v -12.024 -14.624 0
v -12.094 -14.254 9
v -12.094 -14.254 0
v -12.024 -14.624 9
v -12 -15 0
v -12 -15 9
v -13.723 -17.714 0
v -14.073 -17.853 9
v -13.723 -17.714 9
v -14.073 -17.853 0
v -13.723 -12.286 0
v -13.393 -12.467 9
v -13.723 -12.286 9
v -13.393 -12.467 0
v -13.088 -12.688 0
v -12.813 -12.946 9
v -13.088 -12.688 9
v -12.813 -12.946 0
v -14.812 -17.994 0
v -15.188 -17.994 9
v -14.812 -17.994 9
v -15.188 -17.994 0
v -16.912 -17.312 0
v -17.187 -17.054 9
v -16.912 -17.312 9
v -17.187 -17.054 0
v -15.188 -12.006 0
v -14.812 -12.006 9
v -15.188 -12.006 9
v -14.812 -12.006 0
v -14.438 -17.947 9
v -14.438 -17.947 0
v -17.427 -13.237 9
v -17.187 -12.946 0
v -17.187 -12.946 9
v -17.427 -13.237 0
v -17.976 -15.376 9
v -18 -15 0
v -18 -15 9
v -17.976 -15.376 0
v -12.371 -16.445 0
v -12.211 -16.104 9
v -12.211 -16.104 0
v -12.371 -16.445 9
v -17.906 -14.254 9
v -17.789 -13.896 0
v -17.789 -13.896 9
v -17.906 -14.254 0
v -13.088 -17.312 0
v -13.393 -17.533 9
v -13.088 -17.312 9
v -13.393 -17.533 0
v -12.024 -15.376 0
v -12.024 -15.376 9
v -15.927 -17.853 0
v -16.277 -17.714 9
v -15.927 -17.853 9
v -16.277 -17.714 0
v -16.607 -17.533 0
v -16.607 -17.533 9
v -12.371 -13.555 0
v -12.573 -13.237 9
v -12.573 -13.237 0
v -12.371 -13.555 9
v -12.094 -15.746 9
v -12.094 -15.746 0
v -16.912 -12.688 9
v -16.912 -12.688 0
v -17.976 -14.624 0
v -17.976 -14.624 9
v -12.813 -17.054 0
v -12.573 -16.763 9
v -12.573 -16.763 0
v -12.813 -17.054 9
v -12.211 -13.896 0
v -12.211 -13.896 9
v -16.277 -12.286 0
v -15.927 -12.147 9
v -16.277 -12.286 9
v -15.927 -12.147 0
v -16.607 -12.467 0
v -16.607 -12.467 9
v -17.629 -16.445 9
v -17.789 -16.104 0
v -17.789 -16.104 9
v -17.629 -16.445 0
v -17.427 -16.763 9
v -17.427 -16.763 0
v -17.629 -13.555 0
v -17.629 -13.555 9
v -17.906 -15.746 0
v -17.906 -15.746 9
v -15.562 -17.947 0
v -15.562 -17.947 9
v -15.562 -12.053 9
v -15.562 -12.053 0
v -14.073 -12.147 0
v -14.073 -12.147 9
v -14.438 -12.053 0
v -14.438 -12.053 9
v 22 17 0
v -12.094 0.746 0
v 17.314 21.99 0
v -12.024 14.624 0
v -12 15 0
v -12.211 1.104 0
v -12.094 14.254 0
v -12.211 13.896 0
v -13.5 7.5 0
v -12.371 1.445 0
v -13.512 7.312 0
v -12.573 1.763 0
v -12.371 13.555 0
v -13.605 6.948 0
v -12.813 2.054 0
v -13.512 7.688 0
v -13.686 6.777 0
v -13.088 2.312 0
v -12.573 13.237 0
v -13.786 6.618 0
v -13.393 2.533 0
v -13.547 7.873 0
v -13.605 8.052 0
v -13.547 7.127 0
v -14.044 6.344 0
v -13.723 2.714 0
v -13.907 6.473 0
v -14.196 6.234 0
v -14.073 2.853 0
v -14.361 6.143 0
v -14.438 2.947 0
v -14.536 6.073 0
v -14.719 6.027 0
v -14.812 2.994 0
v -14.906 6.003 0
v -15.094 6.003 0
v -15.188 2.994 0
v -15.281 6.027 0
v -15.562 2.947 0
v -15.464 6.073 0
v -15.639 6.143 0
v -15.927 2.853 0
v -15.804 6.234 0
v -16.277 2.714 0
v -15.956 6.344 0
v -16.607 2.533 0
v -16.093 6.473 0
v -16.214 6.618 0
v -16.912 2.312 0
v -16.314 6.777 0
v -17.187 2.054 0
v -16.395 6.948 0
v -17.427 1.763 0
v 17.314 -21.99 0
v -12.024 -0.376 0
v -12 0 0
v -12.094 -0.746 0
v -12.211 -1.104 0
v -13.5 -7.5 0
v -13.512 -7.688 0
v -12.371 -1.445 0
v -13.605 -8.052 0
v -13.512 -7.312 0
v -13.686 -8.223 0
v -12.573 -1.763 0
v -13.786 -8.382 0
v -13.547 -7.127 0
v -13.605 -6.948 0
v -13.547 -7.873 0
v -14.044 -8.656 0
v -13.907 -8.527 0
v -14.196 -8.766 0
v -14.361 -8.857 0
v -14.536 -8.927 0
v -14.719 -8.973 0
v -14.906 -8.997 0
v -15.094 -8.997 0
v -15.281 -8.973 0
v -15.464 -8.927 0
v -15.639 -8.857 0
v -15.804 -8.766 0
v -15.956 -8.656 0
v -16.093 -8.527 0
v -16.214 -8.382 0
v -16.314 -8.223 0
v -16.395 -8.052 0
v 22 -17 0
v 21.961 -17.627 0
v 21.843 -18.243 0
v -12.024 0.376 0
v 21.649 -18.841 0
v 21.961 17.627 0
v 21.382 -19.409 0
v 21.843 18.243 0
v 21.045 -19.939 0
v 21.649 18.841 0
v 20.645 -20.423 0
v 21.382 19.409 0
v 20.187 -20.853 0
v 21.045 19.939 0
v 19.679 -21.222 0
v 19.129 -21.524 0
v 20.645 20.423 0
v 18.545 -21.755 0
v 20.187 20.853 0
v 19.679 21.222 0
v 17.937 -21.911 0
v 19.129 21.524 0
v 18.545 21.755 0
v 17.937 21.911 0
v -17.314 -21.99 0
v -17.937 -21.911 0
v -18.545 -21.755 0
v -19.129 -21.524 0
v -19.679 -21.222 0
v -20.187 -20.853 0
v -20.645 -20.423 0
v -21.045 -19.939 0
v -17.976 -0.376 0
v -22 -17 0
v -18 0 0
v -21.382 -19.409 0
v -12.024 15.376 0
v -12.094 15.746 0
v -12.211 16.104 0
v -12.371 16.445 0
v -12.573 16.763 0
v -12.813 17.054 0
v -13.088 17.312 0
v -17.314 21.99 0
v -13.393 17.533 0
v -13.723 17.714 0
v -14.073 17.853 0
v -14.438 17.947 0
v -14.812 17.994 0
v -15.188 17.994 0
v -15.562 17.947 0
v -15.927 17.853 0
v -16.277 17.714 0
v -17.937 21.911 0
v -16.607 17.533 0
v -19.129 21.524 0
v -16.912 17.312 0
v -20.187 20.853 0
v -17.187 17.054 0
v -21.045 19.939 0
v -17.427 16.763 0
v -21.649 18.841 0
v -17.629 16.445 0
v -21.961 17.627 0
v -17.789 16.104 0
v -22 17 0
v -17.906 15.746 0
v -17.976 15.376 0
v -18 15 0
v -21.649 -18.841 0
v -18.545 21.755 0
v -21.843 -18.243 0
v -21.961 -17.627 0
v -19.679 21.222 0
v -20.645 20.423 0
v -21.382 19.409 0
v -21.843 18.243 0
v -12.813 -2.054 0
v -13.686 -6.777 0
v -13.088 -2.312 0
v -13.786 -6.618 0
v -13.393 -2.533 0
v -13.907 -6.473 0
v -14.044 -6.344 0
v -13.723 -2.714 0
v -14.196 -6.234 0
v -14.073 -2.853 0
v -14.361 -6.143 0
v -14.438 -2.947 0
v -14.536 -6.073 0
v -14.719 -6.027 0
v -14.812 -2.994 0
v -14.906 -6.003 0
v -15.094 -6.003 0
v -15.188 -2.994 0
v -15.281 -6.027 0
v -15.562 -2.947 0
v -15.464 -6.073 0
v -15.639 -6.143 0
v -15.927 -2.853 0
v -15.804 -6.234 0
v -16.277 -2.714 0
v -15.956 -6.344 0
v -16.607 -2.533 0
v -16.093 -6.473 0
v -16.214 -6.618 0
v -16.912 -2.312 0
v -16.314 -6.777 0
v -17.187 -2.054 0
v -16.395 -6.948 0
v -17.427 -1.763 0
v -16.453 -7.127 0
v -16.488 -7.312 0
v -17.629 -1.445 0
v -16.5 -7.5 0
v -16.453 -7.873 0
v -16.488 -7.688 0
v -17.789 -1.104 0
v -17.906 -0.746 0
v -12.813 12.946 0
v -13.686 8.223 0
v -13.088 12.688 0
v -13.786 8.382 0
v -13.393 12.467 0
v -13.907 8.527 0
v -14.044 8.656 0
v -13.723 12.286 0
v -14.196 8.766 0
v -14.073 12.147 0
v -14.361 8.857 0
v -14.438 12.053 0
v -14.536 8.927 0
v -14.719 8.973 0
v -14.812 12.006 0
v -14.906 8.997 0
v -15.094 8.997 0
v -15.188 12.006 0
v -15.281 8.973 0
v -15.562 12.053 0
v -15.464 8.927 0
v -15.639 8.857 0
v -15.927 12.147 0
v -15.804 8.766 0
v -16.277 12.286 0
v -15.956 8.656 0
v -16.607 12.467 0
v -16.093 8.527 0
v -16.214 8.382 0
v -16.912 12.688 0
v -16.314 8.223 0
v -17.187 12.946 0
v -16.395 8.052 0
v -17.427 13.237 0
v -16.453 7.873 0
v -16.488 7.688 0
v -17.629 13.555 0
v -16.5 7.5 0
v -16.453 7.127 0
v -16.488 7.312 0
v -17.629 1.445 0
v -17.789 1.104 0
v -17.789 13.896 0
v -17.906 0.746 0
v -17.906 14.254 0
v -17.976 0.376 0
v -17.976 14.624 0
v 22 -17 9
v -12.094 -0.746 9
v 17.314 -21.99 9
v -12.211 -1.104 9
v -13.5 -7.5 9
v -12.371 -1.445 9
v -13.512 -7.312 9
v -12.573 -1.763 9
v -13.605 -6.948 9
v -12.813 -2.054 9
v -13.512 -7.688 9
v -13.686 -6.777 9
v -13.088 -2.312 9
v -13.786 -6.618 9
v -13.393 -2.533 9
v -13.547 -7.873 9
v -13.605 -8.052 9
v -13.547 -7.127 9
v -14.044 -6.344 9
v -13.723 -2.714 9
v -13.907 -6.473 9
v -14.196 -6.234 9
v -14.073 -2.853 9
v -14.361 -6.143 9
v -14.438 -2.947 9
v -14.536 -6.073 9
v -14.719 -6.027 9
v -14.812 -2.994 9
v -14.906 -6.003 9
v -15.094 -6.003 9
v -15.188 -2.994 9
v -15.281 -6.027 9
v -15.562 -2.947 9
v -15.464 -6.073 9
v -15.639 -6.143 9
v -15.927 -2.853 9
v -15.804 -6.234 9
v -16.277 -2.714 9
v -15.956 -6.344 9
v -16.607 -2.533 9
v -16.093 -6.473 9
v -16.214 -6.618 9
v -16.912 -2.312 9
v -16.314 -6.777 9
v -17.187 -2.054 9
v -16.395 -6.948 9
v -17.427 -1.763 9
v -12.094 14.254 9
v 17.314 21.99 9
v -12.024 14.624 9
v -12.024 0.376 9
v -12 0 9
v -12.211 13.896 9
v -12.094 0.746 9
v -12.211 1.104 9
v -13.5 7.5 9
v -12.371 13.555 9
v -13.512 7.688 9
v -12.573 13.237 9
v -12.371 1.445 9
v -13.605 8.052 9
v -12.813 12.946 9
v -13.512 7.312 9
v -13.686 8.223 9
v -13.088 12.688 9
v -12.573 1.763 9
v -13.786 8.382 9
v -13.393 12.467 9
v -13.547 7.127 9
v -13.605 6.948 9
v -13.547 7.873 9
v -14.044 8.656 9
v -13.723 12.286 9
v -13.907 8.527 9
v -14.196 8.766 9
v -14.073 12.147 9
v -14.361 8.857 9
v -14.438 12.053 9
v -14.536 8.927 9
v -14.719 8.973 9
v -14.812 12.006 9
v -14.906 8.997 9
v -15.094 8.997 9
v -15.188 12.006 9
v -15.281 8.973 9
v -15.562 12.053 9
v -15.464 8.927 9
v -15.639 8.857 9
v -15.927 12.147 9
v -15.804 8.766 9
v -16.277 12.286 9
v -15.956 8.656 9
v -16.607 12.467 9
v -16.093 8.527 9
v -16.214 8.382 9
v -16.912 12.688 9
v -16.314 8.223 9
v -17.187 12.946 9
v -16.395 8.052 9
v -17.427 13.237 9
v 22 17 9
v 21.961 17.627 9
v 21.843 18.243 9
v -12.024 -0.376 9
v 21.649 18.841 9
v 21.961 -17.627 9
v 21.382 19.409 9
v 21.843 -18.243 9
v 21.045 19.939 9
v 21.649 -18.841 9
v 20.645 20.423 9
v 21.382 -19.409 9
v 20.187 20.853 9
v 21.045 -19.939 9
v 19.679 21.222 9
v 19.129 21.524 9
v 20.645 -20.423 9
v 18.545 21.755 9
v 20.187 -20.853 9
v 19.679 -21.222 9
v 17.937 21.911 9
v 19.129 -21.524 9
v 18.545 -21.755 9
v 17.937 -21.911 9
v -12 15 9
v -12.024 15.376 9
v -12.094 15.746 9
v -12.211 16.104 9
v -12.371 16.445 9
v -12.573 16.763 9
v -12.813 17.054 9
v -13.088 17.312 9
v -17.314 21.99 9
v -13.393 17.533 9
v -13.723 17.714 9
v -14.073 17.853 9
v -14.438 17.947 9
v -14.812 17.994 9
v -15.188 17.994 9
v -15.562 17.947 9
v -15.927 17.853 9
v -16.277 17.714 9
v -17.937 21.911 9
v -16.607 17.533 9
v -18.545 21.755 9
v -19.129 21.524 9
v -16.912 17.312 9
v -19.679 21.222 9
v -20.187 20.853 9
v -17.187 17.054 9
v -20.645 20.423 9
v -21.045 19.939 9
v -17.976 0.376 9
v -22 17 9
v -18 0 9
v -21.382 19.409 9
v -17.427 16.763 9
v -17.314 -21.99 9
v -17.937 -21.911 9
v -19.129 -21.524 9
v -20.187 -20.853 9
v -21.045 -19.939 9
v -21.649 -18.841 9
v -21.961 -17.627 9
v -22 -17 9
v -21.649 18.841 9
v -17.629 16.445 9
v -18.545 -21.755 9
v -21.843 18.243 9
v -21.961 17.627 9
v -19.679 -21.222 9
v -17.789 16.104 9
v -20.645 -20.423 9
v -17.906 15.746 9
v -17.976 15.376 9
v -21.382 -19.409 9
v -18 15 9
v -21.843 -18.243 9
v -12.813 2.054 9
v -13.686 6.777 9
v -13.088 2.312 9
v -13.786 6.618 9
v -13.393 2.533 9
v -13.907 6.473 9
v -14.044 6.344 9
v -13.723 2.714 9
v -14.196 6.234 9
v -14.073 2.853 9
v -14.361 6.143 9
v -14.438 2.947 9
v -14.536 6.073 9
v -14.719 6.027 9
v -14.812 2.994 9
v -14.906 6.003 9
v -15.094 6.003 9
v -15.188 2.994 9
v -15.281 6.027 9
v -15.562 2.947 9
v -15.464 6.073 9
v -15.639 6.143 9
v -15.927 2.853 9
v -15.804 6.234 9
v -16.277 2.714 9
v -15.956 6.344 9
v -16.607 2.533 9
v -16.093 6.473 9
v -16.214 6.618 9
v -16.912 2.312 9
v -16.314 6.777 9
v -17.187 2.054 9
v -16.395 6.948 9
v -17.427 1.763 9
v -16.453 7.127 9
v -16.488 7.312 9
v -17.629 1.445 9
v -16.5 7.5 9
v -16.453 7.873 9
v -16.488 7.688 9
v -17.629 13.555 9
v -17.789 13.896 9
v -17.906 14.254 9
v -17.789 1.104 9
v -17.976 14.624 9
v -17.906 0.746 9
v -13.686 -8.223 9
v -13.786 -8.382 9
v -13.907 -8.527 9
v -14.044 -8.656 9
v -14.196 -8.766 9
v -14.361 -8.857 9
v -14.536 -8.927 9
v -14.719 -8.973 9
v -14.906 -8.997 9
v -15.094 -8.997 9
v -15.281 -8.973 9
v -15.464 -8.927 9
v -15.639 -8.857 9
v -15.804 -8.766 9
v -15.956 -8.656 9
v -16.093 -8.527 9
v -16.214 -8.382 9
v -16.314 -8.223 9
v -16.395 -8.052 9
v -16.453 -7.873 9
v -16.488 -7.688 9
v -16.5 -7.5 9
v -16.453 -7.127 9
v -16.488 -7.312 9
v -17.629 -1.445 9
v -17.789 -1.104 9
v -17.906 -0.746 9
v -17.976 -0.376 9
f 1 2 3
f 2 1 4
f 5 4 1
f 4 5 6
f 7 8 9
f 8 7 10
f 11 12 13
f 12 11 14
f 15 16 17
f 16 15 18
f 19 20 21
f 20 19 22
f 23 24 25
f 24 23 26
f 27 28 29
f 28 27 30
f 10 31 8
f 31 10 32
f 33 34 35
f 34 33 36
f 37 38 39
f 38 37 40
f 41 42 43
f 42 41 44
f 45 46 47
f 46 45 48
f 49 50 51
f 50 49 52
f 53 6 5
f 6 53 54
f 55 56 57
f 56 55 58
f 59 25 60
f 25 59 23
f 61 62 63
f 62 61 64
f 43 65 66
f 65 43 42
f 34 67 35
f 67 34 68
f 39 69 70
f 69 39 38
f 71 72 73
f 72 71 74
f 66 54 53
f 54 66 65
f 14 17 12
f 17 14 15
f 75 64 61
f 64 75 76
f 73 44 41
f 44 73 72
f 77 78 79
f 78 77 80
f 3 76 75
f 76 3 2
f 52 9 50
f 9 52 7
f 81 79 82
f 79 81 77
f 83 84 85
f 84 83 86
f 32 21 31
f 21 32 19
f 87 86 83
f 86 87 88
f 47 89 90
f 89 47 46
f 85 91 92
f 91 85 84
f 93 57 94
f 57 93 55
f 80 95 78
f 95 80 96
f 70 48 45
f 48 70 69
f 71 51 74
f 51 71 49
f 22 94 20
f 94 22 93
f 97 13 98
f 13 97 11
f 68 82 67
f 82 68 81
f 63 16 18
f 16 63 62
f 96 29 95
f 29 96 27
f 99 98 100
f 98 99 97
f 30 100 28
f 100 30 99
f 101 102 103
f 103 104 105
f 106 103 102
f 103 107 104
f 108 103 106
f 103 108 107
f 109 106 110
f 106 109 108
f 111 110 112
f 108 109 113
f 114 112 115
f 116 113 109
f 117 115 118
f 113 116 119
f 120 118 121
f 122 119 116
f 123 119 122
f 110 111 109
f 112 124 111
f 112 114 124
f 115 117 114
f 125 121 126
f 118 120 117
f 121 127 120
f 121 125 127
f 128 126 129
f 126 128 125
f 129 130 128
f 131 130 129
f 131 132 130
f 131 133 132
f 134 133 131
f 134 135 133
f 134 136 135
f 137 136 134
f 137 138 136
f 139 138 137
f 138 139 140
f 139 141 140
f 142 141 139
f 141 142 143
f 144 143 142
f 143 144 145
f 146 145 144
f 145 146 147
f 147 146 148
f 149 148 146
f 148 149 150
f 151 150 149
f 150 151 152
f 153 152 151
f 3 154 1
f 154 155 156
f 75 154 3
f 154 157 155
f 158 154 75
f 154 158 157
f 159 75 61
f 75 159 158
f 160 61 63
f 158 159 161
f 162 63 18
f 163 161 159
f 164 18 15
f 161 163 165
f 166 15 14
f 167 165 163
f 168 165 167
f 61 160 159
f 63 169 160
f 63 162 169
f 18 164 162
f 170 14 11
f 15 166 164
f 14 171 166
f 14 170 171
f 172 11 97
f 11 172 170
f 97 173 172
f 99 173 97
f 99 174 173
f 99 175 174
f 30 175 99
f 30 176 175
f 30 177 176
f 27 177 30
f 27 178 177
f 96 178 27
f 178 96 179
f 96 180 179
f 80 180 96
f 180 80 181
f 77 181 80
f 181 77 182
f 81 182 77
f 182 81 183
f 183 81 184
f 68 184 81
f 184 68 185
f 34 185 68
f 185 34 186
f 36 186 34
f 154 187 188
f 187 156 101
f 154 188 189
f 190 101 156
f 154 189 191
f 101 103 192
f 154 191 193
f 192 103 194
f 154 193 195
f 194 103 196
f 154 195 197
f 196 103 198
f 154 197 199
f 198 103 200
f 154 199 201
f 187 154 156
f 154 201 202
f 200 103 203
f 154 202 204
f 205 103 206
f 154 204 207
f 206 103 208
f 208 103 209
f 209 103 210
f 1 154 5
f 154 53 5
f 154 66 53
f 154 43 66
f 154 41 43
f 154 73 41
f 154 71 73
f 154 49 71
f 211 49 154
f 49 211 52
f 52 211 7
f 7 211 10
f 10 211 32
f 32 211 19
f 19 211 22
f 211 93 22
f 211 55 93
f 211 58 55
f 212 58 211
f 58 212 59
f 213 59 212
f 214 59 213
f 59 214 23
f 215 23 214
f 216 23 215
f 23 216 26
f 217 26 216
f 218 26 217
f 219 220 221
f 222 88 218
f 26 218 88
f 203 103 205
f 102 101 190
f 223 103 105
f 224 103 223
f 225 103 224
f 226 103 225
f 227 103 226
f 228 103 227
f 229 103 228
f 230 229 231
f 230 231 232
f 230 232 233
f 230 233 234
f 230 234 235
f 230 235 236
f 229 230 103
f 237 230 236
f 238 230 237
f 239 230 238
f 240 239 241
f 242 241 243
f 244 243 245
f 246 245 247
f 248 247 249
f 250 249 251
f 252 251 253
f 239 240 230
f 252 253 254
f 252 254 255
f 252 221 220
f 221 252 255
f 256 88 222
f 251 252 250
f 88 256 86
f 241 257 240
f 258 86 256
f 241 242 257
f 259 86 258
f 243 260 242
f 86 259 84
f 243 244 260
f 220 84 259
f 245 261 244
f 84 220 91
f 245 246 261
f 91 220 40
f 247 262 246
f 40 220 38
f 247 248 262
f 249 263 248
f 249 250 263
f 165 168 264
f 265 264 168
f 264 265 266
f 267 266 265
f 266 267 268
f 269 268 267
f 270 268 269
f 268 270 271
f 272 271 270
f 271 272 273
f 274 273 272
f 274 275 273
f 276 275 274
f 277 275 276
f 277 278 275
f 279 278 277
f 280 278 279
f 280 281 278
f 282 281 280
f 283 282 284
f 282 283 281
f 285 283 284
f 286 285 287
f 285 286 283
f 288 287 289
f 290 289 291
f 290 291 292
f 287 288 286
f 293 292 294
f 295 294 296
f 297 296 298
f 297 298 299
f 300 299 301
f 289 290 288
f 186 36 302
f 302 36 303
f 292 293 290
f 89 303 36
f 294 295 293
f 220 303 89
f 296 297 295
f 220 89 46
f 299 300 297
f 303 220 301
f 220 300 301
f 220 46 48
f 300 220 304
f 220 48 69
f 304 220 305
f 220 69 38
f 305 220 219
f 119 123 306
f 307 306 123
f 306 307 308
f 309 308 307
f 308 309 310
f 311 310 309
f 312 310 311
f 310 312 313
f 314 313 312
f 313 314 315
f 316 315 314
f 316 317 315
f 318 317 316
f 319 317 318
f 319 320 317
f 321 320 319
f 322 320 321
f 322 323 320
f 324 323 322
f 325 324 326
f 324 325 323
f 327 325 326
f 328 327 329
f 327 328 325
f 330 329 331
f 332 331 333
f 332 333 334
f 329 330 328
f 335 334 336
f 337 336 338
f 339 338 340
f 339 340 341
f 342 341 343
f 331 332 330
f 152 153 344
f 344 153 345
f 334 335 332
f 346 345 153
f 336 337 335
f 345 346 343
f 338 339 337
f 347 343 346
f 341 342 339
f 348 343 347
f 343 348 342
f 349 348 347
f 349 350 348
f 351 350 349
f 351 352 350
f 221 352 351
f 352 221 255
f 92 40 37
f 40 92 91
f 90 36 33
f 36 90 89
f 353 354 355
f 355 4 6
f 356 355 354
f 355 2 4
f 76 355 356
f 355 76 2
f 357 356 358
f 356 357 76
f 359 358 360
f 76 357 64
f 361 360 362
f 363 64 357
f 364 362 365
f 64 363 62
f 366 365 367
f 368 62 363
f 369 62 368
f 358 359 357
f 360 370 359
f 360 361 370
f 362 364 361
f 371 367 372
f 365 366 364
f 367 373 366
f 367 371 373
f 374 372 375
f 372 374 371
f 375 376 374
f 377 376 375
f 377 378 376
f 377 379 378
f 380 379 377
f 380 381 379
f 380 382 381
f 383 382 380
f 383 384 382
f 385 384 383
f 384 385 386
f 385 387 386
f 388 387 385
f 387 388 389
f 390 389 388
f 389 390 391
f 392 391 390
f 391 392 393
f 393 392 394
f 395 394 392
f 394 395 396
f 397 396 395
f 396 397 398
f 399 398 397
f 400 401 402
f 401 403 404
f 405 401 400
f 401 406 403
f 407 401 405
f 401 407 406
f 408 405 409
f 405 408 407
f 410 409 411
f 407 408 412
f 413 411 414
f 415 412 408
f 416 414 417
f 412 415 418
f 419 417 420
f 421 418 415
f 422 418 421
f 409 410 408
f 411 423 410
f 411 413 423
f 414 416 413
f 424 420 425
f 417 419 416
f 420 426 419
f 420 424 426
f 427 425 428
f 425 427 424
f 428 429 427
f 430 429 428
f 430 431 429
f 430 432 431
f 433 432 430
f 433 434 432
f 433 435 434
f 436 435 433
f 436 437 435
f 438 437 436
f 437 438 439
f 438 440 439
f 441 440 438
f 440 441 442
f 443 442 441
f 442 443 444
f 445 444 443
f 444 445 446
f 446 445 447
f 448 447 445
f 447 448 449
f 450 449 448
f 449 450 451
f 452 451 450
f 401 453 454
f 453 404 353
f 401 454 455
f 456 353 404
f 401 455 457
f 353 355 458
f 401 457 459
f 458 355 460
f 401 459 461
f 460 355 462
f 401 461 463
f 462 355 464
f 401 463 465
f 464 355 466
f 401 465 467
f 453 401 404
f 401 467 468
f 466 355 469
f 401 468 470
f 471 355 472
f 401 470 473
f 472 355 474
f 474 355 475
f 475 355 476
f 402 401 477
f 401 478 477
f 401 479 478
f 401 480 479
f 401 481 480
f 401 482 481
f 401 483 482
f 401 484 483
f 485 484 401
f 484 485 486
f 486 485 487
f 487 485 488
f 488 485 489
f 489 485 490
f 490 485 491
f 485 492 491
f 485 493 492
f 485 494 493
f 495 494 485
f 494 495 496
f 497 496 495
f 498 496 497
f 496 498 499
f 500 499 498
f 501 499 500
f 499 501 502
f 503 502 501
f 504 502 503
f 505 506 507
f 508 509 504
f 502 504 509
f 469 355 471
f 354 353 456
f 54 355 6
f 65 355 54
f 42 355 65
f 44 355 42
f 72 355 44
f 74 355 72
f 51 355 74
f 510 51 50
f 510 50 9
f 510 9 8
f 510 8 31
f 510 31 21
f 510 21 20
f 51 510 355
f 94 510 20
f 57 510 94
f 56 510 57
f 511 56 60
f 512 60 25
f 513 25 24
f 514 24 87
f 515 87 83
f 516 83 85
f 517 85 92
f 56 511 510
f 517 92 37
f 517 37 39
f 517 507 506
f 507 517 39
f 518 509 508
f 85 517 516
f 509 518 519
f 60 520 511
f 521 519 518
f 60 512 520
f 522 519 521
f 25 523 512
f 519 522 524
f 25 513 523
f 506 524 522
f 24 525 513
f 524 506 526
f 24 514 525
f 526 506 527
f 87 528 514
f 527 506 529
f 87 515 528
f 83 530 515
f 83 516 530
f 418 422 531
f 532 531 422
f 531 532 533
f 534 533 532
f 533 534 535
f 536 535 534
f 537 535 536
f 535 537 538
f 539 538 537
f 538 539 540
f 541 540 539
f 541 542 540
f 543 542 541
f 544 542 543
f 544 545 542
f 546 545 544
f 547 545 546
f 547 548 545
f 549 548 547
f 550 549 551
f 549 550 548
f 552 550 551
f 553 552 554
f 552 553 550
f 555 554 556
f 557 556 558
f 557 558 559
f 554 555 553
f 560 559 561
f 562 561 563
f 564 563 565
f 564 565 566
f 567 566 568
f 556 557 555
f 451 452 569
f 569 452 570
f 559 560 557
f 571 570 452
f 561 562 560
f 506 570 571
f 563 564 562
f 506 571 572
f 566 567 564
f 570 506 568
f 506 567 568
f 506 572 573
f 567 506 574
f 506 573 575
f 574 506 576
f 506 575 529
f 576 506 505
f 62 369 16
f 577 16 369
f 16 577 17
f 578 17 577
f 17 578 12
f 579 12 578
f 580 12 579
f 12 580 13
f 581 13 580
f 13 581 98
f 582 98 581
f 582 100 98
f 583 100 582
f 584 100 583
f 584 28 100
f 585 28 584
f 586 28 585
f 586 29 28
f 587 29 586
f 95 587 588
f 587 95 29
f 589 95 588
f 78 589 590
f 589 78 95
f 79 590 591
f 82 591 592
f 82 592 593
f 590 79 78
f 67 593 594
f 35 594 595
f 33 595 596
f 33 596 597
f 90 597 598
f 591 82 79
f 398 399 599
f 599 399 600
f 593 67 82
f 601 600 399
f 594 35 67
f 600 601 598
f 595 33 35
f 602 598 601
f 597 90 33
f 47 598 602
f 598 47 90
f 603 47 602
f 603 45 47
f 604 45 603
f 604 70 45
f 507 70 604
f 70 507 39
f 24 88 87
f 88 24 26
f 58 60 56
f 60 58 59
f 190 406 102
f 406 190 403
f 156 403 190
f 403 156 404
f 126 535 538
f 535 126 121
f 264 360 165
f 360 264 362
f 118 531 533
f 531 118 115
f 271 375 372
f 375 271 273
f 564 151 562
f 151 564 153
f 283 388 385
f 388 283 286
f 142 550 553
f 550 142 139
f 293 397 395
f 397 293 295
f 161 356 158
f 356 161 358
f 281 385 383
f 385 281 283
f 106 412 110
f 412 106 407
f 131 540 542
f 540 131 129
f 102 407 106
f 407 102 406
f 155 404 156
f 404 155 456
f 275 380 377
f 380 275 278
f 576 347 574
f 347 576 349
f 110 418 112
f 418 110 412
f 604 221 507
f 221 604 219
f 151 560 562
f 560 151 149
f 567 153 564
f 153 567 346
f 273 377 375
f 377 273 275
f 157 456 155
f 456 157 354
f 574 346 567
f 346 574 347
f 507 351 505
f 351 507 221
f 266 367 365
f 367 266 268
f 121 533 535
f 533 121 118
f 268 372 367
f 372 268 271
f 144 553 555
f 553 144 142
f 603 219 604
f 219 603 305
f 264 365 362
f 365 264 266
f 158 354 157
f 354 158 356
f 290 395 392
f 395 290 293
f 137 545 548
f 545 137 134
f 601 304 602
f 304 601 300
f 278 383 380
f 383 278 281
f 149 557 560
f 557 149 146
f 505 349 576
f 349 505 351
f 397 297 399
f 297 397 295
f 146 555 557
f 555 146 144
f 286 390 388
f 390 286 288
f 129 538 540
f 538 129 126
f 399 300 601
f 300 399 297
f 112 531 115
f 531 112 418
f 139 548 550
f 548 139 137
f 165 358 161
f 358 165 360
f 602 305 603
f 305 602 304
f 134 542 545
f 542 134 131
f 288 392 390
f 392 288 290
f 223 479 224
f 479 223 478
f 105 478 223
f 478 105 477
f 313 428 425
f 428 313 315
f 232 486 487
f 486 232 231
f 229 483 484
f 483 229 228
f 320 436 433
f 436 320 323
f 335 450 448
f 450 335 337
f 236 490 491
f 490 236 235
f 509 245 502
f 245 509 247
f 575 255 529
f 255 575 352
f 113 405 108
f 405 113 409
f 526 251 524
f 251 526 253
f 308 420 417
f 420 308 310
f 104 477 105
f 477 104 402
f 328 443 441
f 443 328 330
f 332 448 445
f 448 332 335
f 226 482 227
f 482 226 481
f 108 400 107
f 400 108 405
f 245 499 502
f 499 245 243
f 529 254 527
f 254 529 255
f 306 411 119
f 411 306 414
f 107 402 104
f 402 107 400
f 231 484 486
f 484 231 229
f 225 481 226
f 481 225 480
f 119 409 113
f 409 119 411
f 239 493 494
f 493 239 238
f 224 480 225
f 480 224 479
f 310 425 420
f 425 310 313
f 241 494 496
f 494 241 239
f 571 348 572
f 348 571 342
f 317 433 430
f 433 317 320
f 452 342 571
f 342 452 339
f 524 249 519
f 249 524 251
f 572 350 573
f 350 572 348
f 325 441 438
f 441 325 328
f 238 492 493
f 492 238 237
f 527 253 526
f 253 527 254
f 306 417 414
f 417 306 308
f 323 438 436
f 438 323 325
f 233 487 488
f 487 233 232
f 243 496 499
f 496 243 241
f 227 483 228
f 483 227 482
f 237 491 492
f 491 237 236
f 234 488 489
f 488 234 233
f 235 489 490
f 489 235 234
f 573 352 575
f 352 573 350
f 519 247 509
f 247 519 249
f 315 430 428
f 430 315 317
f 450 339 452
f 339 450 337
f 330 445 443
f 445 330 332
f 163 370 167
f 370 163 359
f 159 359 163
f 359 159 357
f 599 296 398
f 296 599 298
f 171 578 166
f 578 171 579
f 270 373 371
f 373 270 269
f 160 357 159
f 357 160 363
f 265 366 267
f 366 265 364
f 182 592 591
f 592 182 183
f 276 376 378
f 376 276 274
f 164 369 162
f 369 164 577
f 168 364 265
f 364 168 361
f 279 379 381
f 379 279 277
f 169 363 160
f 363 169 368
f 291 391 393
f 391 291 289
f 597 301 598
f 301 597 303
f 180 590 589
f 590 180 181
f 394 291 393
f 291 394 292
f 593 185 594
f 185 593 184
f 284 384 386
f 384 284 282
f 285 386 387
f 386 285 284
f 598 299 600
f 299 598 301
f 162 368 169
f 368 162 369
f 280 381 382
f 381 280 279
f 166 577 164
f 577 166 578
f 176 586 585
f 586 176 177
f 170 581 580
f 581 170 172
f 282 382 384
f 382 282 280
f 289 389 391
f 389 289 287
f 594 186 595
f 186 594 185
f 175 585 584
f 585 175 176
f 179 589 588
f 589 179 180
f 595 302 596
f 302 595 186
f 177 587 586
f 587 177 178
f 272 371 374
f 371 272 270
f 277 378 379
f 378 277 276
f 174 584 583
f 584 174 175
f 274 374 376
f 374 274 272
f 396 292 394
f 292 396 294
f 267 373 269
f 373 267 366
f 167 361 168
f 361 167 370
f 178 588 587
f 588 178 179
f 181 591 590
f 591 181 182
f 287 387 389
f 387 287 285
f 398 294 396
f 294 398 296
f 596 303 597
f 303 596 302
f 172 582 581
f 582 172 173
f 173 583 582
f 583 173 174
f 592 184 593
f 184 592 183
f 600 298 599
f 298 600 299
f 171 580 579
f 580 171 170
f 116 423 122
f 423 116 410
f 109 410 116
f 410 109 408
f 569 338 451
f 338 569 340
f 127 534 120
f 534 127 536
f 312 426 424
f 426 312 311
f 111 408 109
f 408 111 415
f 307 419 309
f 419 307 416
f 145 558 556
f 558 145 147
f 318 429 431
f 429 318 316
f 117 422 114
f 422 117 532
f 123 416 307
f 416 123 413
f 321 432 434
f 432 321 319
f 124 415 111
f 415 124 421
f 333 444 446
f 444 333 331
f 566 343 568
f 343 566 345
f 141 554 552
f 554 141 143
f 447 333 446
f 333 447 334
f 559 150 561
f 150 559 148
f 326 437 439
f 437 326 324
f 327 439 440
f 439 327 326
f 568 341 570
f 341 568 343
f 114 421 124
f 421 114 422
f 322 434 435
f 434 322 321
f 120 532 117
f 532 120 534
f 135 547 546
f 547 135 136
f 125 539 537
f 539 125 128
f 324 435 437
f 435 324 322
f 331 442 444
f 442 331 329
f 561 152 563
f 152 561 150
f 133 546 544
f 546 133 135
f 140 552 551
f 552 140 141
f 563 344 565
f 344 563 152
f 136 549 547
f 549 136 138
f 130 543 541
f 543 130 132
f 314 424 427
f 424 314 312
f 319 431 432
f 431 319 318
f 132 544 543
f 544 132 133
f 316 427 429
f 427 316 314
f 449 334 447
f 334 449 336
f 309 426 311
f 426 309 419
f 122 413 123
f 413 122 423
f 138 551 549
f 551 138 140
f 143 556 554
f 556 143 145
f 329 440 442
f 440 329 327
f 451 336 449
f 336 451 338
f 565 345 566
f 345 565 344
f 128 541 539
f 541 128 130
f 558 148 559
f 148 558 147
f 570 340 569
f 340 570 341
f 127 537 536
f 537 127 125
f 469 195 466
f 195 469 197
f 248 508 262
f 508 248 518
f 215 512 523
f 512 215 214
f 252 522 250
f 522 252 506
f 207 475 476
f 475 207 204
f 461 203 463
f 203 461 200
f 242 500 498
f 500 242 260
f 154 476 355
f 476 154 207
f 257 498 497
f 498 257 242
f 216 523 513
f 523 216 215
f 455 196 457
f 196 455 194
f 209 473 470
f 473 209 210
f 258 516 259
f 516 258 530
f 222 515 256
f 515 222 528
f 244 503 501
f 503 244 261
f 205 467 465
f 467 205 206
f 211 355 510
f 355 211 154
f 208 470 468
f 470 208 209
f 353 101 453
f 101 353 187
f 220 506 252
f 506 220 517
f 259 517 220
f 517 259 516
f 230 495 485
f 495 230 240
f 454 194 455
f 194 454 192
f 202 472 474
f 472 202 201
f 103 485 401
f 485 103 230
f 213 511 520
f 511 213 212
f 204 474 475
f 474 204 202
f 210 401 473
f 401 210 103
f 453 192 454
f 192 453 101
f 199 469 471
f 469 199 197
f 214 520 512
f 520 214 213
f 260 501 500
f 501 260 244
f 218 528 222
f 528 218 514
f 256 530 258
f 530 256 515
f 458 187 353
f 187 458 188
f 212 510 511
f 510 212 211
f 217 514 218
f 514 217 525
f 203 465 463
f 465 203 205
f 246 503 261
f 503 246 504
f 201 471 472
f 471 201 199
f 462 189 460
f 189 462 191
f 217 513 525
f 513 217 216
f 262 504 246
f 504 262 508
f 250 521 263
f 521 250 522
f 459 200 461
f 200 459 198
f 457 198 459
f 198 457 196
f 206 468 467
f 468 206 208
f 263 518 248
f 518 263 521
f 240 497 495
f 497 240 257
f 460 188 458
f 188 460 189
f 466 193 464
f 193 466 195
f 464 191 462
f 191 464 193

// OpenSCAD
$fn = 50;


difference() {
	union() {
		hull() {
			translate(v = [-17.0000000000, 17.0000000000, 0]) {
				cylinder(h = 9, r = 5);
			}
			translate(v = [17.0000000000, 17.0000000000, 0]) {
				cylinder(h = 9, r = 5);
			}
			translate(v = [-17.0000000000, -17.0000000000, 0]) {
				cylinder(h = 9, r = 5);
			}
			translate(v = [17.0000000000, -17.0000000000, 0]) {
				cylinder(h = 9, r = 5);
			}
		}
	}
	union() {
		translate(v = [-15.0000000000, -15.0000000000, 0]) {
			cylinder(h = 9, r = 3.0000000000);
		}
		translate(v = [-15.0000000000, 0.0000000000, 0]) {
			cylinder(h = 9, r = 3.0000000000);
		}
		translate(v = [-15.0000000000, 15.0000000000, 0]) {
			cylinder(h = 9, r = 3.0000000000);
		}
		translate(v = [-15.0000000000, -15.0000000000, 0]) {
			cylinder(h = 9, r = 1.5000000000);
		}
		translate(v = [-15.0000000000, -7.5000000000, 0]) {
			cylinder(h = 9, r = 1.5000000000);
		}
		translate(v = [-15.0000000000, 0.0000000000, 0]) {
			cylinder(h = 9, r = 1.5000000000);
		}
		translate(v = [-15.0000000000, 7.5000000000, 0]) {
			cylinder(h = 9, r = 1.5000000000);
		}
		translate(v = [-15.0000000000, 15.0000000000, 0]) {
			cylinder(h = 9, r = 1.5000000000);
		}
		translate(v = [-15.0000000000, -15.0000000000, 0]) {
			cylinder(h = 9, r = 1.5000000000);
		}
		translate(v = [-15.0000000000, -7.5000000000, 0]) {
			cylinder(h = 9, r = 1.5000000000);
		}
		translate(v = [-15.0000000000, 0.0000000000, 0]) {
			cylinder(h = 9, r = 1.5000000000);
		}
		translate(v = [-15.0000000000, 7.5000000000, 0]) {
			cylinder(h = 9, r = 1.5000000000);
		}
		translate(v = [-15.0000000000, 15.0000000000, 0]) {
			cylinder(h = 9, r = 1.5000000000);
		}
		translate(v = [-15.0000000000, -15.0000000000, 0]) {
			cylinder(h = 9, r = 1.5000000000);
		}
		translate(v = [-15.0000000000, -7.5000000000, 0]) {
			cylinder(h = 9, r = 1.5000000000);
		}
		translate(v = [-15.0000000000, 0.0000000000, 0]) {
			cylinder(h = 9, r = 1.5000000000);
		}
		translate(v = [-15.0000000000, 7.5000000000, 0]) {
			cylinder(h = 9, r = 1.5000000000);
		}
		translate(v = [-15.0000000000, 15.0000000000, 0]) {
			cylinder(h = 9, r = 1.5000000000);
		}
	}
}
